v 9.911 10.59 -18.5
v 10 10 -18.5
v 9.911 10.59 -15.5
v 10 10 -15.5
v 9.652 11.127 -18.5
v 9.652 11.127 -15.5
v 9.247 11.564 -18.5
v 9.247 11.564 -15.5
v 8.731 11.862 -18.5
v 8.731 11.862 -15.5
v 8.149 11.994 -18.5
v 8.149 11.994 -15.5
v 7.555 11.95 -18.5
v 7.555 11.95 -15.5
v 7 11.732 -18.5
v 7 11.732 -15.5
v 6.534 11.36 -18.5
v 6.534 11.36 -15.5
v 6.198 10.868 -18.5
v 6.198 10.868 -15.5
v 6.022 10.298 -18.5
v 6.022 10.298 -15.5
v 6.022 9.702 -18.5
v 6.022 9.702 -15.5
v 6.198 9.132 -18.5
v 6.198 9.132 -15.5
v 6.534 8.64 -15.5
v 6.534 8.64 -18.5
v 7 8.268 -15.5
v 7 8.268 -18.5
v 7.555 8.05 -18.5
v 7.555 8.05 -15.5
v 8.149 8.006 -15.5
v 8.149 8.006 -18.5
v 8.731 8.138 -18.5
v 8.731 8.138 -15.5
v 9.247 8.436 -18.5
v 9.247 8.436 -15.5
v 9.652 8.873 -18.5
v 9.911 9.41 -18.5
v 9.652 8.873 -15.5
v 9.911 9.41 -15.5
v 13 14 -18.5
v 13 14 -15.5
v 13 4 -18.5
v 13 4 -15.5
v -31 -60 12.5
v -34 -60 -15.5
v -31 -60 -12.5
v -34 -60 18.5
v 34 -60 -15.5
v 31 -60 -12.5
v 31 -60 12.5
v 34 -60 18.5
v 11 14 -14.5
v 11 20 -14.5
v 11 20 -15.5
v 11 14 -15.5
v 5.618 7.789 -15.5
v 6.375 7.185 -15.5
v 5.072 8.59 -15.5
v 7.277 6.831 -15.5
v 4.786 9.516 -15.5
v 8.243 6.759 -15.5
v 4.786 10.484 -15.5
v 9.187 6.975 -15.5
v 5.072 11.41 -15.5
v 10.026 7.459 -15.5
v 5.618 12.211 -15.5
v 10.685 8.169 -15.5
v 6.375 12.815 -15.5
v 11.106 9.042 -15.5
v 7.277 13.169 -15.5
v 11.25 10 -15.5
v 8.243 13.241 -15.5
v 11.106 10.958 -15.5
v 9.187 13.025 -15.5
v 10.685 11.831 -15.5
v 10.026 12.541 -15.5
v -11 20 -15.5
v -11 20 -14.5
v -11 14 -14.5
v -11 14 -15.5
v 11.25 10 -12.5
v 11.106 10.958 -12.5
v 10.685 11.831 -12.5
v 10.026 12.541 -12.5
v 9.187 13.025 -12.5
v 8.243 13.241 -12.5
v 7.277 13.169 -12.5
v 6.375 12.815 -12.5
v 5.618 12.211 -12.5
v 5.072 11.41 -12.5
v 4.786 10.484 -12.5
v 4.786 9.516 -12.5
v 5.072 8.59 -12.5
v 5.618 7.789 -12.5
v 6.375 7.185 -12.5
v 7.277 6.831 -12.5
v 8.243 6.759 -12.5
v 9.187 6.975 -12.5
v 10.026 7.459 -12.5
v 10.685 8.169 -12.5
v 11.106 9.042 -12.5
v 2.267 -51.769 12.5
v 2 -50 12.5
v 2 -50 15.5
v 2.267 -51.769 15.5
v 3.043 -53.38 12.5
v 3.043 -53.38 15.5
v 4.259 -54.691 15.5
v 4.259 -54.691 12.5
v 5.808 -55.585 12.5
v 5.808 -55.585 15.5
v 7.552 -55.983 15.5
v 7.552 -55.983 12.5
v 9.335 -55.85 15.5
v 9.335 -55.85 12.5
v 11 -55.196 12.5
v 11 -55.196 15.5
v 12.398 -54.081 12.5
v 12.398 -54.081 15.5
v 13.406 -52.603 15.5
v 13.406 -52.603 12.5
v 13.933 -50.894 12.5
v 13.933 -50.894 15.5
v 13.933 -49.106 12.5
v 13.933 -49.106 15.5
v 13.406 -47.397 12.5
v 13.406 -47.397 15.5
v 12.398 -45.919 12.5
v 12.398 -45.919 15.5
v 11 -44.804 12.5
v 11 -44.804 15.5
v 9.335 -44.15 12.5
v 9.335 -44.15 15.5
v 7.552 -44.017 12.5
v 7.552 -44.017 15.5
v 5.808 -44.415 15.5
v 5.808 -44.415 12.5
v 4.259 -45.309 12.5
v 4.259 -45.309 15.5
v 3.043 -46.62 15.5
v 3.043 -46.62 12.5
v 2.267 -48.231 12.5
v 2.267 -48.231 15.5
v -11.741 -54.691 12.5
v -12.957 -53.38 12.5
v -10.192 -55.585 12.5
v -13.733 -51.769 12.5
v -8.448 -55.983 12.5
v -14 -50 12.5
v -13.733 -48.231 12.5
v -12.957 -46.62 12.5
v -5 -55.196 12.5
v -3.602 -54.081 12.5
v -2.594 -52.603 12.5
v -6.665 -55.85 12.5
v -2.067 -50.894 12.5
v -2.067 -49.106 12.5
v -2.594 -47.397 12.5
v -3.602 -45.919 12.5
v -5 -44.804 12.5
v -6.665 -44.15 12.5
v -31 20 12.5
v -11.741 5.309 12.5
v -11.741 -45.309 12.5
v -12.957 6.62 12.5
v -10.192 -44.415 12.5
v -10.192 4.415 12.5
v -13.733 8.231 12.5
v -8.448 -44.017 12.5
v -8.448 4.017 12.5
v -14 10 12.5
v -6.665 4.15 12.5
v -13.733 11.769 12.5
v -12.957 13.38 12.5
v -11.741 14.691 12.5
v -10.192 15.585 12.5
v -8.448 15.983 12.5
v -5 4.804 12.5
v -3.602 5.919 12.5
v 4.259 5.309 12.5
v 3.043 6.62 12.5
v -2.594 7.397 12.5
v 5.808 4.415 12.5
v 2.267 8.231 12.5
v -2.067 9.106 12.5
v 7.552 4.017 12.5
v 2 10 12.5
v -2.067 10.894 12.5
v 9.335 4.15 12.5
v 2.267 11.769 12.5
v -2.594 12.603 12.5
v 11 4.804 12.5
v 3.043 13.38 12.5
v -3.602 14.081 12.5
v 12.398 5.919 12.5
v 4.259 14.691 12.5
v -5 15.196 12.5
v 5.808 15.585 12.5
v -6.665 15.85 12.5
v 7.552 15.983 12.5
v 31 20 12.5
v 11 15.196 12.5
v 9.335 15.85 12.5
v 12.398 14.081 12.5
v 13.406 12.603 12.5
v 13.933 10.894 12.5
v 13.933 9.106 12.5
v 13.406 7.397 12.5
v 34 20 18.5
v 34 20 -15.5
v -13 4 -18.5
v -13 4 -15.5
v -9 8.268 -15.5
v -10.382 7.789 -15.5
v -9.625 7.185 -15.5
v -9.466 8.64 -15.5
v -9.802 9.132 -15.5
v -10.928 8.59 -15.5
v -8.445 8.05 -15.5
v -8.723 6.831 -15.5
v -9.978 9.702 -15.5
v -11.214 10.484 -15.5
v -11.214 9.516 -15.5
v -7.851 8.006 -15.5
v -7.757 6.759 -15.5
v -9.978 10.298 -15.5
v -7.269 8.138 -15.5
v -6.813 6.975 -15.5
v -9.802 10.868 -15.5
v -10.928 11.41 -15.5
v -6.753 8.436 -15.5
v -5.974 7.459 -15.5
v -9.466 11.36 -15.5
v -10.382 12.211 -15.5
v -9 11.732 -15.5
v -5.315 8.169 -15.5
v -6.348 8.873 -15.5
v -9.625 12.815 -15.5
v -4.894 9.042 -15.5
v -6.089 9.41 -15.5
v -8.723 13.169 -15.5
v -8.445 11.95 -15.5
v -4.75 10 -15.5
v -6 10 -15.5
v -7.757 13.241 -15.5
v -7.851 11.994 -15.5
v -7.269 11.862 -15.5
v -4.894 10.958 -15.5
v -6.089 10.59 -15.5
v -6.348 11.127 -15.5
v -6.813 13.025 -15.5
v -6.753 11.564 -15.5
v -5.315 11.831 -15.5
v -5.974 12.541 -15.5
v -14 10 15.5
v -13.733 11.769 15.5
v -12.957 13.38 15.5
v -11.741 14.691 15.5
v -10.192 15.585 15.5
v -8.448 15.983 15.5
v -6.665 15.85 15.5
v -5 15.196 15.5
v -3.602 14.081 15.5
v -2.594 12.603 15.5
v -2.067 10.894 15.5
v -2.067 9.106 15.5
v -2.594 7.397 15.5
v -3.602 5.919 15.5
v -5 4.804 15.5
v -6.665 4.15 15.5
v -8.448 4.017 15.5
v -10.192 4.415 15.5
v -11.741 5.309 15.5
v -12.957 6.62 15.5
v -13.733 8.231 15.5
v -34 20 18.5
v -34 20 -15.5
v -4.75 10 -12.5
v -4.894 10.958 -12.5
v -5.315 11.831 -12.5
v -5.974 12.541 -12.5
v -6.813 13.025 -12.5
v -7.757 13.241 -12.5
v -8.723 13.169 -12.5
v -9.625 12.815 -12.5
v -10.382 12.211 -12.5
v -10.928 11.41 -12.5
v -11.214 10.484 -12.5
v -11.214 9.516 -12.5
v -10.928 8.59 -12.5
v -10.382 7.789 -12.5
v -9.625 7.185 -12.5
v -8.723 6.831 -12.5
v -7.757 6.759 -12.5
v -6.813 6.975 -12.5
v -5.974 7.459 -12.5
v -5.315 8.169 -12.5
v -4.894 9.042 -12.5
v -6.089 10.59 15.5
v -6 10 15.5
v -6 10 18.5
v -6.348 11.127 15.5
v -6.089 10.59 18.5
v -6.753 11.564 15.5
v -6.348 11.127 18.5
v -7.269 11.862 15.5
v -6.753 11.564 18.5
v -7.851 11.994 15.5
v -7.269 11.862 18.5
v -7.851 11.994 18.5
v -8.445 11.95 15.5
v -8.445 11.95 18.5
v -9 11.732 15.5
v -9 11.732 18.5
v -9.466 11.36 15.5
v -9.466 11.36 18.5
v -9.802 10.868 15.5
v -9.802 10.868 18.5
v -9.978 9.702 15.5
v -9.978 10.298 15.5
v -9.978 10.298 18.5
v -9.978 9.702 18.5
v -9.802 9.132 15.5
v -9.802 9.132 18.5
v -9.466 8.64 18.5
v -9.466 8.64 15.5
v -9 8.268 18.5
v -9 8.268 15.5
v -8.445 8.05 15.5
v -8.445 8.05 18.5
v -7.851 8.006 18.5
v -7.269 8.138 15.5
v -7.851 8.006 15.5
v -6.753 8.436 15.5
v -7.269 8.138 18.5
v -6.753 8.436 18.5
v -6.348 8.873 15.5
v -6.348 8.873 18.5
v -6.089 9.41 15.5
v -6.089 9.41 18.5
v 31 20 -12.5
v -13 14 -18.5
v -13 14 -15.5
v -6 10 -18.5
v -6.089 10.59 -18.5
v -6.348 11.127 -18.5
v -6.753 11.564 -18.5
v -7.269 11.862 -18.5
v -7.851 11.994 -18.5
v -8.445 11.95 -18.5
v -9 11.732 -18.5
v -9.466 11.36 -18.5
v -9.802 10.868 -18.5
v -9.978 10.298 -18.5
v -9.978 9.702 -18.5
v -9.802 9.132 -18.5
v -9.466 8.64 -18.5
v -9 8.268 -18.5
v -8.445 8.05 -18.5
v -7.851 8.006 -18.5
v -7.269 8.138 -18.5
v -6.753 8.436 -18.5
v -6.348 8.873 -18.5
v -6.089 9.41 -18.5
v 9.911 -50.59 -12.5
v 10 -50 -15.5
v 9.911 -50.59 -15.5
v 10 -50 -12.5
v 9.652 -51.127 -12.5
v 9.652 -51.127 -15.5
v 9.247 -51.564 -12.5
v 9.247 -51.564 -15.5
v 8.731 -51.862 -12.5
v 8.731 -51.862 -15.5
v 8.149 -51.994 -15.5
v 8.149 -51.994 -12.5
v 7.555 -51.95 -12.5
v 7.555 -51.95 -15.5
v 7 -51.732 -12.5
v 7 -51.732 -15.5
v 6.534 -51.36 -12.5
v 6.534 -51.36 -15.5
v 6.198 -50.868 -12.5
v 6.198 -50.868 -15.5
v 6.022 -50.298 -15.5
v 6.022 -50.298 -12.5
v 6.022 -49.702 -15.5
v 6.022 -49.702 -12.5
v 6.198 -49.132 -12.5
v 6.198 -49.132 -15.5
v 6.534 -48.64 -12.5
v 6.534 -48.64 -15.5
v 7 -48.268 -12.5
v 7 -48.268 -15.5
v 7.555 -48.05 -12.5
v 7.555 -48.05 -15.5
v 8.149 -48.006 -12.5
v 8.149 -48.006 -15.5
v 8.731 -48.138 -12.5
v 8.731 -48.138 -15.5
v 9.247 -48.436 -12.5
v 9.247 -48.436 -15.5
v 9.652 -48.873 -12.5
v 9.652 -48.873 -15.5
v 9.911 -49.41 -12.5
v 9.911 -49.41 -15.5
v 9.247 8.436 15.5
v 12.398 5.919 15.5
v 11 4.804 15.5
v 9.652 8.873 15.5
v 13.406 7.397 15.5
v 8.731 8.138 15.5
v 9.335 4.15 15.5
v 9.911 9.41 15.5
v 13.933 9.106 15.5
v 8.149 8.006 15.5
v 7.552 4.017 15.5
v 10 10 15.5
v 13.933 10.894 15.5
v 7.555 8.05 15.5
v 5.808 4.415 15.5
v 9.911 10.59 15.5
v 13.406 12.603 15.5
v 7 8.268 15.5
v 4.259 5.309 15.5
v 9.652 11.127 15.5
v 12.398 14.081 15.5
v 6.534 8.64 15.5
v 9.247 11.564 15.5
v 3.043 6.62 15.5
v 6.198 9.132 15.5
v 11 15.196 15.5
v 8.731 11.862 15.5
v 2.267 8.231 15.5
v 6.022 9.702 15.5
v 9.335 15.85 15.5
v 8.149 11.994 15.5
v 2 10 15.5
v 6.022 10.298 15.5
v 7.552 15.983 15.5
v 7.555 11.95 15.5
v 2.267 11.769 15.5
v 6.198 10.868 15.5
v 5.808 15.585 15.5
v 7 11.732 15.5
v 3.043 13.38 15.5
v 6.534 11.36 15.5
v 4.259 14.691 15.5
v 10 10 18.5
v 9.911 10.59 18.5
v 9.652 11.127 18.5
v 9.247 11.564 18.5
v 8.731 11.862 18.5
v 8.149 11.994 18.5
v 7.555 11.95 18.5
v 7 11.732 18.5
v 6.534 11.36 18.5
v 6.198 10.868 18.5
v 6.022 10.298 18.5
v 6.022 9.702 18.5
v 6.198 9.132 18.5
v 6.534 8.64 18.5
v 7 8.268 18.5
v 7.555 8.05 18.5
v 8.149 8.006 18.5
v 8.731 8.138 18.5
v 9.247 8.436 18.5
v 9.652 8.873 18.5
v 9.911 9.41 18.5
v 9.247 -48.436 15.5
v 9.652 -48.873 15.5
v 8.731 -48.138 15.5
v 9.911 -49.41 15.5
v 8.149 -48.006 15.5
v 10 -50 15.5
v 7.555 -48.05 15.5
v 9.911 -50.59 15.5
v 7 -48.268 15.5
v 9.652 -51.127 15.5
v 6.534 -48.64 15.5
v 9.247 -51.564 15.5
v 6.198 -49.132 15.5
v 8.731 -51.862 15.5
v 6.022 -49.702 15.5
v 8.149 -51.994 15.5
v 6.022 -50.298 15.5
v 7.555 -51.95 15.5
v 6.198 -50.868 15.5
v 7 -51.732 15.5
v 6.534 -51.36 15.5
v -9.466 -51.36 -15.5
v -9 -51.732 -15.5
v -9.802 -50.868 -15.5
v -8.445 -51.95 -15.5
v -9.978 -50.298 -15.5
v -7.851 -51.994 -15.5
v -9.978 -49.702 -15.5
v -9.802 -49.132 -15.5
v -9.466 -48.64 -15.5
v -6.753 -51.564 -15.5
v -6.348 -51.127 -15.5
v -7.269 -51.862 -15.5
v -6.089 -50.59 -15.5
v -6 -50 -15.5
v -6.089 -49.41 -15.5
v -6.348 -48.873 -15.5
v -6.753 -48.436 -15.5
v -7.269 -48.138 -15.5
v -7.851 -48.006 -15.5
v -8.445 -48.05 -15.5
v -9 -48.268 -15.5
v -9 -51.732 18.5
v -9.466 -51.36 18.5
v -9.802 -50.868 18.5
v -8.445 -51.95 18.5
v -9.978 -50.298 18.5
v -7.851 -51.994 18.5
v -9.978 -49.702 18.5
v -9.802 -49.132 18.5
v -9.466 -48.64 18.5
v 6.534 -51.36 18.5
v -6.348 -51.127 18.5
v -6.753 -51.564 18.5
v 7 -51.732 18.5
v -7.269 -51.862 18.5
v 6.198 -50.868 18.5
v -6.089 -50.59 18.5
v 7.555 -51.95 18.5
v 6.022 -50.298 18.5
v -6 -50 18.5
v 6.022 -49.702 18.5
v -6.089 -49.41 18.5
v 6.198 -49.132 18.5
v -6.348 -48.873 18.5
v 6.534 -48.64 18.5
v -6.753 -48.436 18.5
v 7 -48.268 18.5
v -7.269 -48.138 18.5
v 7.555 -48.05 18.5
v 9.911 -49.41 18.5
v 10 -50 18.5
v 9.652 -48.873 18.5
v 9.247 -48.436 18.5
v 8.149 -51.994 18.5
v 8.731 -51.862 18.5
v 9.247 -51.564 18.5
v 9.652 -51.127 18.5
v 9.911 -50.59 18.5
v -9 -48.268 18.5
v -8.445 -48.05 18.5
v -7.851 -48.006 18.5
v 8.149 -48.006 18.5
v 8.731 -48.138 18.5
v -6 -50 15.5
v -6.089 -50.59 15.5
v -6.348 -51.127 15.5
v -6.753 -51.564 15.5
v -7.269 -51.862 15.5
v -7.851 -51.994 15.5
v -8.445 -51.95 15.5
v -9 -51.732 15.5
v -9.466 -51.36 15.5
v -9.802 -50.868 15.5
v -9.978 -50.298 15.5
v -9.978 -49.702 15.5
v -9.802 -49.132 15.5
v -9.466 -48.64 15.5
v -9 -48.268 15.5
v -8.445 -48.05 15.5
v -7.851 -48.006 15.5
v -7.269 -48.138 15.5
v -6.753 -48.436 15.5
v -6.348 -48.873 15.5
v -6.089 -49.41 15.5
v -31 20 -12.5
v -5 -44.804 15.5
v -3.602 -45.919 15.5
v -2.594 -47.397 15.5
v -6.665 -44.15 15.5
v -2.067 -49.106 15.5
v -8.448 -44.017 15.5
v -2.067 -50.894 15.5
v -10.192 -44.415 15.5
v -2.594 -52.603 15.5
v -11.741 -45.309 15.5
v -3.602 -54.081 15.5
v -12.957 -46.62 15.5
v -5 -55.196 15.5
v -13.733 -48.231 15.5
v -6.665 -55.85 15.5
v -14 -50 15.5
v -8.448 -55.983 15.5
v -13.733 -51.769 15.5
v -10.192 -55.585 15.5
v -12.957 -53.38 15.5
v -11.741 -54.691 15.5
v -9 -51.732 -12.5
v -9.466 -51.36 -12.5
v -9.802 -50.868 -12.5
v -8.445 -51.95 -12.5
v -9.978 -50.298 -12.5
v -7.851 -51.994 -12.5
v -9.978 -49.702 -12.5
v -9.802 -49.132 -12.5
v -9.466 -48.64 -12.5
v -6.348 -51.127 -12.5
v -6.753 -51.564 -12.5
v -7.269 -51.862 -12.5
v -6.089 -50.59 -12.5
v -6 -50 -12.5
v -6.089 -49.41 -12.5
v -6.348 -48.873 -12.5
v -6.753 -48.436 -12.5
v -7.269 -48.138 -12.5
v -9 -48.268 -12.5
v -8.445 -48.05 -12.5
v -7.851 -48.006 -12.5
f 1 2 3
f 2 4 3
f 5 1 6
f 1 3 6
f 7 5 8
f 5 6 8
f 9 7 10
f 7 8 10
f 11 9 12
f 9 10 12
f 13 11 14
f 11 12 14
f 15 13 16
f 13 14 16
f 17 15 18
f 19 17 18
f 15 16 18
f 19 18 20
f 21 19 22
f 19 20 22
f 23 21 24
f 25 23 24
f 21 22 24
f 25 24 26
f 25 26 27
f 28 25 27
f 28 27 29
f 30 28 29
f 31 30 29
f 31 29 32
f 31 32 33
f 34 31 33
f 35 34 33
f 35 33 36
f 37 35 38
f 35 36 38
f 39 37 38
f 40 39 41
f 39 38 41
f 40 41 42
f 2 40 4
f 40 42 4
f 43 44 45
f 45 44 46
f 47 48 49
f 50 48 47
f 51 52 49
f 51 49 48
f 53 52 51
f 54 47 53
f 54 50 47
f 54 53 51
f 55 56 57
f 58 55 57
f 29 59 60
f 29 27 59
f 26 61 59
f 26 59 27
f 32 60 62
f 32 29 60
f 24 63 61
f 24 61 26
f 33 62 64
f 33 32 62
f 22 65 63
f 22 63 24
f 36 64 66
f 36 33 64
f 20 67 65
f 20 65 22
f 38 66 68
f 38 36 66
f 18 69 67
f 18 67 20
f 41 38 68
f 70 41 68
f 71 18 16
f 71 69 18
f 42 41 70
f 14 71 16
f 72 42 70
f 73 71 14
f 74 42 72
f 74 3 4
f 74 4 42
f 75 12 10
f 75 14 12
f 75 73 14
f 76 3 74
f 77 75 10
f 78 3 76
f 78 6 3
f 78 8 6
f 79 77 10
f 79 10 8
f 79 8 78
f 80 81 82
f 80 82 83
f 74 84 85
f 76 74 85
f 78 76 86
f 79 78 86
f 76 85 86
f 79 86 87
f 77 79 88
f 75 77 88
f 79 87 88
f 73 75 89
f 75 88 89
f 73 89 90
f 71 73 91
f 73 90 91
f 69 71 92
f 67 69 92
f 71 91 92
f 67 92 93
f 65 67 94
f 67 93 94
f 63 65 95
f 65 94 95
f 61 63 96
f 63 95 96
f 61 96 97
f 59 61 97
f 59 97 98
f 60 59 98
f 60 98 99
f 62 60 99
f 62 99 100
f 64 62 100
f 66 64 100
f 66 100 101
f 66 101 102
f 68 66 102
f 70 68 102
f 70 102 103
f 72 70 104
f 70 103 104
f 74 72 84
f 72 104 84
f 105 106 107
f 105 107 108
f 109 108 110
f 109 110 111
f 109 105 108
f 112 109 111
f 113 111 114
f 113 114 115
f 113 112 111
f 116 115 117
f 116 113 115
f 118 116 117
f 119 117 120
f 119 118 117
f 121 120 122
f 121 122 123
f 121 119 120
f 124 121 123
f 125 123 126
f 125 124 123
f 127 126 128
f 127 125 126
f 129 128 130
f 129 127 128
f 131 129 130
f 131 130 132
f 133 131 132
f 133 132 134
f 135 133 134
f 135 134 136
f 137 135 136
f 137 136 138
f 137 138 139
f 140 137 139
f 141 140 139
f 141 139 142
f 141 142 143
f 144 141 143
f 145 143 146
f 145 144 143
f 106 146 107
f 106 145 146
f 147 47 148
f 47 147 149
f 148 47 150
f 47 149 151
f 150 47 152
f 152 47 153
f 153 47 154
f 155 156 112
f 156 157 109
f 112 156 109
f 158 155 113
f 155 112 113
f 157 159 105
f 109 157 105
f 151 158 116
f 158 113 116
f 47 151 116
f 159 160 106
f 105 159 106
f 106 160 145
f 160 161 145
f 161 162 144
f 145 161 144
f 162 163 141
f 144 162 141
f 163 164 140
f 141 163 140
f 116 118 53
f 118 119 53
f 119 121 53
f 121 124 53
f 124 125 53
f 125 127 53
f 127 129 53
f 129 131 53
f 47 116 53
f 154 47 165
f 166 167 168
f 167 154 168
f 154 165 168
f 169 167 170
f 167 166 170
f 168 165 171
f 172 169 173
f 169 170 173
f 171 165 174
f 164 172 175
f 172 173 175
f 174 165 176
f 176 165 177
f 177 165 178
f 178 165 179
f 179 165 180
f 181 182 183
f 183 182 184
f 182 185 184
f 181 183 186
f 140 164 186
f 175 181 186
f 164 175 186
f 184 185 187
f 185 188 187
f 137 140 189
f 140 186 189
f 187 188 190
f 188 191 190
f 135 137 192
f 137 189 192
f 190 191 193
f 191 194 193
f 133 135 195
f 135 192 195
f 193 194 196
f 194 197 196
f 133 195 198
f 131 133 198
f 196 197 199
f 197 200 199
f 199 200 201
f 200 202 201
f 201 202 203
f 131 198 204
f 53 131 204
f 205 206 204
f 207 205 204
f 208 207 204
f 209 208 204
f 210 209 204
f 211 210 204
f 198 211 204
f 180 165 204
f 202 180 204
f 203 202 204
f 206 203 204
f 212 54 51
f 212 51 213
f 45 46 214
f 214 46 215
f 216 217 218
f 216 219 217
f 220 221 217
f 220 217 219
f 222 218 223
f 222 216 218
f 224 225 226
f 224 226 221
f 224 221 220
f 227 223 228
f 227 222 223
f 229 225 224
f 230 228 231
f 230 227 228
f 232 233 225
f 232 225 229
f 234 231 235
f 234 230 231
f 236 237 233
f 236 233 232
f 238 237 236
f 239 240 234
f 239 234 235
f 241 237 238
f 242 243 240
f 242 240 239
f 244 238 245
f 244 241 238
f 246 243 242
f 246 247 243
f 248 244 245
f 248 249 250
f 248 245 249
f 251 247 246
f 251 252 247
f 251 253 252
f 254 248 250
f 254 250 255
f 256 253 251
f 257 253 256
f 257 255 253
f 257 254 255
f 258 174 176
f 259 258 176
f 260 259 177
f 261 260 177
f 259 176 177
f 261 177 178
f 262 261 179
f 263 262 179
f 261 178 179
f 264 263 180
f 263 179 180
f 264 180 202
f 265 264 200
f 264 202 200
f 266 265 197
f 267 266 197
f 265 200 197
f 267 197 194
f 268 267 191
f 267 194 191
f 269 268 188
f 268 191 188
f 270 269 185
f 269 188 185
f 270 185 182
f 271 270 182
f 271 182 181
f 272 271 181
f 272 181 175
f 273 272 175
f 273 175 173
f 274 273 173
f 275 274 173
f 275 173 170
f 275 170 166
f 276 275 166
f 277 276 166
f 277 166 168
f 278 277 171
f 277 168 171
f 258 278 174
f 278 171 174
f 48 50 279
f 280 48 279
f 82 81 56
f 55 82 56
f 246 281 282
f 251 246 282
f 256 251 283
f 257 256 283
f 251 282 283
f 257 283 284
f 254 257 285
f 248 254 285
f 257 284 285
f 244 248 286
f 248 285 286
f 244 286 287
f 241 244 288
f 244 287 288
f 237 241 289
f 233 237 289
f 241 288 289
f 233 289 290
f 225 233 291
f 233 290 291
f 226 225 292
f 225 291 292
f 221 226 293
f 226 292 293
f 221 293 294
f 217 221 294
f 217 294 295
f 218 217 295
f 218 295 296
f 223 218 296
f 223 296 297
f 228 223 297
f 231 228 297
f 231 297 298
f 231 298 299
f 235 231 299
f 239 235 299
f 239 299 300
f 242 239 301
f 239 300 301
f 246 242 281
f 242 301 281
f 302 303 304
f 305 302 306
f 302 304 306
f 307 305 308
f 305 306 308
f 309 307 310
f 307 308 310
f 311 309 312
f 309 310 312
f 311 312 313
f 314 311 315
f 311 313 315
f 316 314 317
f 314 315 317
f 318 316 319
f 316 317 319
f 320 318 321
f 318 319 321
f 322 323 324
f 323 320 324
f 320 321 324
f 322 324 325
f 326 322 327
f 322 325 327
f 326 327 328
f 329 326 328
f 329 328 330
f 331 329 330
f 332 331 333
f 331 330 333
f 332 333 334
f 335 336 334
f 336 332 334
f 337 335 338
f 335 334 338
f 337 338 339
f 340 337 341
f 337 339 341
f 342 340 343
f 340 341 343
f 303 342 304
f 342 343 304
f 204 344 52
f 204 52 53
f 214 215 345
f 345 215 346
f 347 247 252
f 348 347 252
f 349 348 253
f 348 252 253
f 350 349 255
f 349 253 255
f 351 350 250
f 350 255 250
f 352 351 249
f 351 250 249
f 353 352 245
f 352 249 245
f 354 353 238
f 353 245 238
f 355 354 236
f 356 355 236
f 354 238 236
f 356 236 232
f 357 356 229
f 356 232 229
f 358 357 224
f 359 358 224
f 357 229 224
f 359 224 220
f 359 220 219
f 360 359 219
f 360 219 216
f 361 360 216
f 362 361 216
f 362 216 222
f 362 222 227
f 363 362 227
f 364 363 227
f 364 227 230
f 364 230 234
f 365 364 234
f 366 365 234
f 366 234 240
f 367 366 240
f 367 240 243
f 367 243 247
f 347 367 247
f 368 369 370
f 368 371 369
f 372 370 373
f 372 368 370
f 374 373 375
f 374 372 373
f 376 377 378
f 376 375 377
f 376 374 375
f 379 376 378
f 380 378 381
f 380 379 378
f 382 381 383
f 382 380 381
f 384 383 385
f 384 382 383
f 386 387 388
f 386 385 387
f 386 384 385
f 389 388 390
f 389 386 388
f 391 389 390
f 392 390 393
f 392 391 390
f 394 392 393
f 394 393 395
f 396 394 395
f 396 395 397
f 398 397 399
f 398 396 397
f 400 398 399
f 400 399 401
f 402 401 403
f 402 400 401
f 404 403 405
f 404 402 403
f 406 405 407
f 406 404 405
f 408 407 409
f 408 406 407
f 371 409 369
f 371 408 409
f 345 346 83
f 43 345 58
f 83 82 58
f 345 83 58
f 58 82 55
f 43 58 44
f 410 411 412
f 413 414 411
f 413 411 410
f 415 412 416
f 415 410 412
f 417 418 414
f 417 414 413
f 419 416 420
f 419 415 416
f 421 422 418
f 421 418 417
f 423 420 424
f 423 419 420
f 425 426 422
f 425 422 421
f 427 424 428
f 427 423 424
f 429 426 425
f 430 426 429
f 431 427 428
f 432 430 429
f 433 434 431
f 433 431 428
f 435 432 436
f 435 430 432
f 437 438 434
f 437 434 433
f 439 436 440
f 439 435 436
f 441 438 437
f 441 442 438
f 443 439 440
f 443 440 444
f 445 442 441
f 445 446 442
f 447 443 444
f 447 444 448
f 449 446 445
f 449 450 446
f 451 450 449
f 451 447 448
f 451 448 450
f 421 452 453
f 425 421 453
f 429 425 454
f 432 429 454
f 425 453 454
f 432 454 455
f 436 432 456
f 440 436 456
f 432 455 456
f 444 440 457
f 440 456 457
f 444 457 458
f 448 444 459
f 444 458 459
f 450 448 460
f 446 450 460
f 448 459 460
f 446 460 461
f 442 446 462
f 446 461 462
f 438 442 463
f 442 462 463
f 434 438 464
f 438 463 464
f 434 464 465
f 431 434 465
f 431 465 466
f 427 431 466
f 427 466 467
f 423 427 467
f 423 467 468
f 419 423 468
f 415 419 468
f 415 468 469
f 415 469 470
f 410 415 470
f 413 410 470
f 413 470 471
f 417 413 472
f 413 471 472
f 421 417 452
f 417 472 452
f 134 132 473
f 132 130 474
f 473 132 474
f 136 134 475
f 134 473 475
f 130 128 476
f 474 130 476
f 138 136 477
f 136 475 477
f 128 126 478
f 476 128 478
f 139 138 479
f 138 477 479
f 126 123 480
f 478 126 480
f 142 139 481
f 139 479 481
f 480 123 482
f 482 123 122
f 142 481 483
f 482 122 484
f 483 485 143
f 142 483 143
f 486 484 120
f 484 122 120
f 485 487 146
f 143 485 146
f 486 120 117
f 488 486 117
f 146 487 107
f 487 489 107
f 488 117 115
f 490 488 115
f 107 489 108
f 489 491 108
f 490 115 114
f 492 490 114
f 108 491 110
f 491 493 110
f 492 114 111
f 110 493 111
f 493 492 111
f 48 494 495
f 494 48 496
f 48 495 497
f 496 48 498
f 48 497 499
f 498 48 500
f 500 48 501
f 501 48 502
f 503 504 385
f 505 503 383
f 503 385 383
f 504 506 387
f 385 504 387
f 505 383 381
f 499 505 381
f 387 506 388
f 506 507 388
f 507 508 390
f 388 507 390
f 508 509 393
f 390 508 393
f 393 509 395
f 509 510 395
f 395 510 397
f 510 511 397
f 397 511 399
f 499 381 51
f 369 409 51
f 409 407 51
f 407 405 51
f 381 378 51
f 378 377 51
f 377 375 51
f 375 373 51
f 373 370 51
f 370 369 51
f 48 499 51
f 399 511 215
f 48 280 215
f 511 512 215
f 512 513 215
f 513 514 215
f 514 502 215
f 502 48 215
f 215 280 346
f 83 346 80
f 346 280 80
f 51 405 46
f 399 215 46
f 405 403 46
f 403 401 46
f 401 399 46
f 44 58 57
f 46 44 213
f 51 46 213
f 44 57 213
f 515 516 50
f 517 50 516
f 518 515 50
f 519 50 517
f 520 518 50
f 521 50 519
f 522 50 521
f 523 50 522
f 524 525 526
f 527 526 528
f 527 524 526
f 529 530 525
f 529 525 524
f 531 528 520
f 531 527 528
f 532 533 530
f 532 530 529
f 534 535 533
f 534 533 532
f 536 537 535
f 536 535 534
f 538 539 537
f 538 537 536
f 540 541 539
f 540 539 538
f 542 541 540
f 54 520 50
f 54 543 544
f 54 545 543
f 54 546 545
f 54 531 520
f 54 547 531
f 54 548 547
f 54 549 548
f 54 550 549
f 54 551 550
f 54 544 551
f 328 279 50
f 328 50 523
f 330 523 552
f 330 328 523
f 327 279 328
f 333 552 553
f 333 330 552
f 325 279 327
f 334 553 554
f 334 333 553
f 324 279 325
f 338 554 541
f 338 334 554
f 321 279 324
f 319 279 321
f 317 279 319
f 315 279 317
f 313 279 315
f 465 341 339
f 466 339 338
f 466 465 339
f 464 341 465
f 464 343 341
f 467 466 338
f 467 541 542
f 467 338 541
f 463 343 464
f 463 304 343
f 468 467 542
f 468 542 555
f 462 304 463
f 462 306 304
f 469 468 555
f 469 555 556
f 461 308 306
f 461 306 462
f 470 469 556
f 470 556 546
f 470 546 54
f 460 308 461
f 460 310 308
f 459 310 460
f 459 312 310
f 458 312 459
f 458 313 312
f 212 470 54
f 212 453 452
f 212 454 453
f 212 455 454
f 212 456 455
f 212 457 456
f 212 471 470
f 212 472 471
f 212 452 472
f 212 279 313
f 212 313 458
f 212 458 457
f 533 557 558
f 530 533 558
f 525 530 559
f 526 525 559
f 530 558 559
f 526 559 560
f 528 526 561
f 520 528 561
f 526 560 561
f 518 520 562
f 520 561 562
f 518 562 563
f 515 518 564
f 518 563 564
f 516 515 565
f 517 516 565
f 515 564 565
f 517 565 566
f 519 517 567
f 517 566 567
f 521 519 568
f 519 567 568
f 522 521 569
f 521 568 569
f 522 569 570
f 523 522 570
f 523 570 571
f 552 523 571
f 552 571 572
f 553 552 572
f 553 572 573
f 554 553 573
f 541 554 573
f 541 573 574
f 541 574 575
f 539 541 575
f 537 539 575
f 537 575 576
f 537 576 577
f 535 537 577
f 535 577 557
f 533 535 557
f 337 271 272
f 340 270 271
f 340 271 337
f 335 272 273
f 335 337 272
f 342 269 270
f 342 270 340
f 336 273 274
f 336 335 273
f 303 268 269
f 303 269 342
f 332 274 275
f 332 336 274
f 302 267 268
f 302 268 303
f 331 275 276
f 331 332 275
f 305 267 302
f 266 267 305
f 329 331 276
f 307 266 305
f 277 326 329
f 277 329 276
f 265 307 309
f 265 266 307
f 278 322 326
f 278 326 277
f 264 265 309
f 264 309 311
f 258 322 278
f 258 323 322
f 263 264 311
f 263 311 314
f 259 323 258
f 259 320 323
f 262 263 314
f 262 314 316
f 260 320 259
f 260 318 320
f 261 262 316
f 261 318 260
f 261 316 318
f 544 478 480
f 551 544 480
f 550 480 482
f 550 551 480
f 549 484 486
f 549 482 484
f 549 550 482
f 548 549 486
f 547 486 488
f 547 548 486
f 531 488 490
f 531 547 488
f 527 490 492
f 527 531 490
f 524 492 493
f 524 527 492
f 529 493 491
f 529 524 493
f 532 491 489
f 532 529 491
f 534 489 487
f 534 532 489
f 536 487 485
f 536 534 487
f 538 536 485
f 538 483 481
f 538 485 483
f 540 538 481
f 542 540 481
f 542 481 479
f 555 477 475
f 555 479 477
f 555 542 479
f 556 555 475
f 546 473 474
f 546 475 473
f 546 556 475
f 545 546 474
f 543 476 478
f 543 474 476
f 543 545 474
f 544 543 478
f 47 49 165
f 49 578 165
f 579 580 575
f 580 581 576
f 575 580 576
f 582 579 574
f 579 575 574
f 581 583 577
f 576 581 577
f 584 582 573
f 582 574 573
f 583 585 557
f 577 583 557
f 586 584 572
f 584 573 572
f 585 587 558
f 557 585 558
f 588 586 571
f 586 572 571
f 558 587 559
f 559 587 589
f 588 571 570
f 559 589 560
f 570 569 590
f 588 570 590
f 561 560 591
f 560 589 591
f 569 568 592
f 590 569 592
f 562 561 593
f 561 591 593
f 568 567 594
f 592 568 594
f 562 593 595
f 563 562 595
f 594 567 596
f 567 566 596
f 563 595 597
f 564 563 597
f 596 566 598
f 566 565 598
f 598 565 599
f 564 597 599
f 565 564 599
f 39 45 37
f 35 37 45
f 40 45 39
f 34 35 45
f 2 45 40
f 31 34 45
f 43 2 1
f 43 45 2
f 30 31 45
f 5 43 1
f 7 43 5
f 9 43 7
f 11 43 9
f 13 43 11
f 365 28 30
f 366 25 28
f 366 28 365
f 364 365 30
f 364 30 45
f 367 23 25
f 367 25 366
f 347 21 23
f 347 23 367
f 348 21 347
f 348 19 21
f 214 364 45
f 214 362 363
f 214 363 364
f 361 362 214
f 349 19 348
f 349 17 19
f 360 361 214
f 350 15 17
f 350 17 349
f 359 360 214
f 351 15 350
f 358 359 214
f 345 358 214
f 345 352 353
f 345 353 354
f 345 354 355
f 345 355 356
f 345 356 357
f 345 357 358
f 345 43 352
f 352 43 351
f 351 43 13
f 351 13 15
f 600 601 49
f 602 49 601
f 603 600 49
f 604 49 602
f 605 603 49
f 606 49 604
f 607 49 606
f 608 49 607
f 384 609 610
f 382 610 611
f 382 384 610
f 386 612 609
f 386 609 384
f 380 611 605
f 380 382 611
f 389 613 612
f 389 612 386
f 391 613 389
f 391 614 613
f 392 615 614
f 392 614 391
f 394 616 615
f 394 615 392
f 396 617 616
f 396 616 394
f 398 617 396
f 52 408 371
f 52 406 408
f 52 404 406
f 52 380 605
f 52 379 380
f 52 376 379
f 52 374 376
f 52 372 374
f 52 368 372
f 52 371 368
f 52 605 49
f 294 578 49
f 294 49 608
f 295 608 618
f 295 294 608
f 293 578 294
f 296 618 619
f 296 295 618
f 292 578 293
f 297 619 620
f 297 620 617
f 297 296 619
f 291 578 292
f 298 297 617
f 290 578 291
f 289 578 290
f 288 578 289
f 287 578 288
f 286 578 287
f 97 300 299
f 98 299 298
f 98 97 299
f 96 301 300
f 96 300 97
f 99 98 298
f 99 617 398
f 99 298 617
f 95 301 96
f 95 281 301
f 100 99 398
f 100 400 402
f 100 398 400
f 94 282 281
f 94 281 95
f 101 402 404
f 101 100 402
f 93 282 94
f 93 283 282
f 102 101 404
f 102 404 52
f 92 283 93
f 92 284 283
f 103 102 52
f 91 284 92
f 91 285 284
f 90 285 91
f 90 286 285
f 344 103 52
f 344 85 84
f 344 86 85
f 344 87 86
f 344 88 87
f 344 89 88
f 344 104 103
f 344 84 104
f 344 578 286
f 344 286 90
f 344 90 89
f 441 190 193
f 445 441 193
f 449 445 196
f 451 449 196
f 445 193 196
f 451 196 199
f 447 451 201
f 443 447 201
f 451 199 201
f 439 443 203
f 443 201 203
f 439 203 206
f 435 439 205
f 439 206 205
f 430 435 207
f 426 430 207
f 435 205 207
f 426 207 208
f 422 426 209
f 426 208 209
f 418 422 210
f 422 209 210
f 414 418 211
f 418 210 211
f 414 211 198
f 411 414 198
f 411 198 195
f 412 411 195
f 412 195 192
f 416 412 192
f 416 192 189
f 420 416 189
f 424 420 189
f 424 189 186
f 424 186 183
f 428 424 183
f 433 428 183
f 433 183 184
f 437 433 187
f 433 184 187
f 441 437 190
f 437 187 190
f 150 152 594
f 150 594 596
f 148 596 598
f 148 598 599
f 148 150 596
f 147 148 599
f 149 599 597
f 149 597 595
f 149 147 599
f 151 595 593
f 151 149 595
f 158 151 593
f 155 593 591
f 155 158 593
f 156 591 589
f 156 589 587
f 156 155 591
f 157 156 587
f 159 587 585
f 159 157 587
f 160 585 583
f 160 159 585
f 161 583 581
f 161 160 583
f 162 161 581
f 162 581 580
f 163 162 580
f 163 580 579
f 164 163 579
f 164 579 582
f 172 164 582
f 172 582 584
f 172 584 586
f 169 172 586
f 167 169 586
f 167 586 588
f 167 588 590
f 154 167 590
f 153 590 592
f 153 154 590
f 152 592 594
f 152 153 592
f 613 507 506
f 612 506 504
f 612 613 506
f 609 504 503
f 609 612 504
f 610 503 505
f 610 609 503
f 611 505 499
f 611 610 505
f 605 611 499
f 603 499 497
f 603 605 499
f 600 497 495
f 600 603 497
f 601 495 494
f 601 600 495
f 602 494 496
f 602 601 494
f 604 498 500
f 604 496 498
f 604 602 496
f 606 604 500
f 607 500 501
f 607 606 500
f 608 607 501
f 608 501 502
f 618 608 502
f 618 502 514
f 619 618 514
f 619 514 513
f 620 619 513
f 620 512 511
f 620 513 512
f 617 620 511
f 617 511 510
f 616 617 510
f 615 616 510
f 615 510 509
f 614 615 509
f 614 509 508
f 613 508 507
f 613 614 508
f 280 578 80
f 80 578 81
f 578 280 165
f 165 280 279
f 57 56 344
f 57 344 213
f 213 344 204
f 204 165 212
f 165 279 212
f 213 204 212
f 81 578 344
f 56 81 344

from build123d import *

# Parameters (mm, degrees)
SKETCH_1_W          = 68
SKETCH_1_H          = 31
SKETCH_1_W_2        = 62
SKETCH_1_H_2        = 25
EXTRUDE_1_DEPTH     = 20
SKETCH_2_W          = 22
SKETCH_2_H          = 1
CUT_EXTRUDE_1_DEPTH = 6
SKETCH_3_R          = 2
CUT_EXTRUDE_2_DEPTH = 3
EXTRUDE_2_DEPTH     = 3
SKETCH_6_R          = 2
CUT_EXTRUDE_3_DEPTH = 49.37354649
SKETCH_8_R          = 3.25
CUT_EXTRUDE_6_DEPTH = 3
SKETCH_9_W          = 68
SKETCH_9_H          = 31
SKETCH_9_W_2        = 62
SKETCH_9_H_2        = 25
EXTRUDE_3_DEPTH     = 60
EXTRUDE_START       = 3
SKETCH_11_W         = 68
SKETCH_11_H         = 80
SKETCH_11_R         = 2
EXTRUDE_5_DEPTH     = 3
SKETCH_12_R         = 6
CUT_EXTRUDE_7_DEPTH = 3


with BuildPart() as part:
    # 草图1 → 凸台-拉伸1 (new body)
    with BuildSketch(Plane(origin=(0, 0, 0), x_dir=(1, 0, 0), z_dir=(0, 1, 0))):
        Rectangle(SKETCH_1_W, SKETCH_1_H)
        Rectangle(SKETCH_1_W_2, SKETCH_1_H_2, mode=Mode.SUBTRACT)
    extrude(amount=EXTRUDE_1_DEPTH)

    # 草图2 → 切除-拉伸1 (cut)
    with BuildSketch(Plane(origin=(0, 20, 0), x_dir=(1, 0, 0), z_dir=(0, 1, 0))):
        with Locations((0, 15)):
            Rectangle(SKETCH_2_W, SKETCH_2_H)
    extrude(amount=-CUT_EXTRUDE_1_DEPTH, mode=Mode.SUBTRACT)

    # 草图3 → 切除-拉伸2 (cut)
    with BuildSketch(Plane(origin=(0, 0, -15.5), x_dir=(-1, 0, 0), z_dir=(0, 0, -1))):
        with Locations((-8, 10)):
            Circle(SKETCH_3_R)
        with Locations((8, 10)):
            Circle(SKETCH_3_R)
    extrude(amount=-CUT_EXTRUDE_2_DEPTH, mode=Mode.SUBTRACT)

    # 草图4 → 凸台-拉伸2 (add)
    with BuildSketch(Plane(origin=(0, 0, -15.5), x_dir=(-1, 0, 0), z_dir=(0, 0, -1))):
        Polygon((-11, 14), (-13, 14), (-13, 4), (-11, 4), (11, 4), (13, 4), (13, 14), (11, 14), align=None)
    extrude(amount=EXTRUDE_2_DEPTH)

    # 草图6 → 切除-拉伸3 (cut, symmetric)
    with BuildSketch(Plane.XY.offset(-12.5)):
        with Locations((-8, 10)):
            Circle(SKETCH_6_R)
        with Locations((8, 10)):
            Circle(SKETCH_6_R)
    cut_extrude_3 = extrude(amount=CUT_EXTRUDE_3_DEPTH, both=True, mode=Mode.SUBTRACT)

    # 草图8 → 切除-拉伸6 (cut)
    with BuildSketch(Plane.XY.offset(-12.5)):
        with Locations((-8, 10)):
            Circle(SKETCH_8_R)
        with Locations((8, 10)):
            Circle(SKETCH_8_R)
    extrude(amount=-CUT_EXTRUDE_6_DEPTH, mode=Mode.SUBTRACT)

    # 草图9 → 凸台-拉伸3 (add)
    with BuildSketch(Plane.XZ):
        Rectangle(SKETCH_9_W, SKETCH_9_H)
        Rectangle(SKETCH_9_W_2, SKETCH_9_H_2, mode=Mode.SUBTRACT)
    extrude(amount=EXTRUDE_3_DEPTH)

    # 草图11 → 凸台-拉伸5 (add)
    with BuildSketch(Plane.XY.offset(15.5).offset(EXTRUDE_START)):
        with Locations((0, -20)):
            Rectangle(SKETCH_11_W, SKETCH_11_H)
        with Locations((-8, 10)):
            Circle(SKETCH_11_R, mode=Mode.SUBTRACT)
        with Locations((8, 10)):
            Circle(SKETCH_11_R, mode=Mode.SUBTRACT)
    extrude(amount=-EXTRUDE_5_DEPTH)

    # 草图12 → 切除-拉伸7 (cut)
    with BuildSketch(Plane(origin=(0, 0, 12.5), x_dir=(-1, 0, 0), z_dir=(0, 0, -1))):
        with Locations((-8, 10)):
            Circle(SKETCH_12_R)
        with Locations((8, 10)):
            Circle(SKETCH_12_R)
    cut_extrude_7 = extrude(amount=-CUT_EXTRUDE_7_DEPTH, mode=Mode.SUBTRACT)

    # 镜向1: 切除-拉伸3, 切除-拉伸7 across plane
    add(cut_extrude_3.mirror(Plane.ZX.offset(-20)), mode=Mode.SUBTRACT)
    add(cut_extrude_7.mirror(Plane.ZX.offset(-20)), mode=Mode.SUBTRACT)


solid = part.part
